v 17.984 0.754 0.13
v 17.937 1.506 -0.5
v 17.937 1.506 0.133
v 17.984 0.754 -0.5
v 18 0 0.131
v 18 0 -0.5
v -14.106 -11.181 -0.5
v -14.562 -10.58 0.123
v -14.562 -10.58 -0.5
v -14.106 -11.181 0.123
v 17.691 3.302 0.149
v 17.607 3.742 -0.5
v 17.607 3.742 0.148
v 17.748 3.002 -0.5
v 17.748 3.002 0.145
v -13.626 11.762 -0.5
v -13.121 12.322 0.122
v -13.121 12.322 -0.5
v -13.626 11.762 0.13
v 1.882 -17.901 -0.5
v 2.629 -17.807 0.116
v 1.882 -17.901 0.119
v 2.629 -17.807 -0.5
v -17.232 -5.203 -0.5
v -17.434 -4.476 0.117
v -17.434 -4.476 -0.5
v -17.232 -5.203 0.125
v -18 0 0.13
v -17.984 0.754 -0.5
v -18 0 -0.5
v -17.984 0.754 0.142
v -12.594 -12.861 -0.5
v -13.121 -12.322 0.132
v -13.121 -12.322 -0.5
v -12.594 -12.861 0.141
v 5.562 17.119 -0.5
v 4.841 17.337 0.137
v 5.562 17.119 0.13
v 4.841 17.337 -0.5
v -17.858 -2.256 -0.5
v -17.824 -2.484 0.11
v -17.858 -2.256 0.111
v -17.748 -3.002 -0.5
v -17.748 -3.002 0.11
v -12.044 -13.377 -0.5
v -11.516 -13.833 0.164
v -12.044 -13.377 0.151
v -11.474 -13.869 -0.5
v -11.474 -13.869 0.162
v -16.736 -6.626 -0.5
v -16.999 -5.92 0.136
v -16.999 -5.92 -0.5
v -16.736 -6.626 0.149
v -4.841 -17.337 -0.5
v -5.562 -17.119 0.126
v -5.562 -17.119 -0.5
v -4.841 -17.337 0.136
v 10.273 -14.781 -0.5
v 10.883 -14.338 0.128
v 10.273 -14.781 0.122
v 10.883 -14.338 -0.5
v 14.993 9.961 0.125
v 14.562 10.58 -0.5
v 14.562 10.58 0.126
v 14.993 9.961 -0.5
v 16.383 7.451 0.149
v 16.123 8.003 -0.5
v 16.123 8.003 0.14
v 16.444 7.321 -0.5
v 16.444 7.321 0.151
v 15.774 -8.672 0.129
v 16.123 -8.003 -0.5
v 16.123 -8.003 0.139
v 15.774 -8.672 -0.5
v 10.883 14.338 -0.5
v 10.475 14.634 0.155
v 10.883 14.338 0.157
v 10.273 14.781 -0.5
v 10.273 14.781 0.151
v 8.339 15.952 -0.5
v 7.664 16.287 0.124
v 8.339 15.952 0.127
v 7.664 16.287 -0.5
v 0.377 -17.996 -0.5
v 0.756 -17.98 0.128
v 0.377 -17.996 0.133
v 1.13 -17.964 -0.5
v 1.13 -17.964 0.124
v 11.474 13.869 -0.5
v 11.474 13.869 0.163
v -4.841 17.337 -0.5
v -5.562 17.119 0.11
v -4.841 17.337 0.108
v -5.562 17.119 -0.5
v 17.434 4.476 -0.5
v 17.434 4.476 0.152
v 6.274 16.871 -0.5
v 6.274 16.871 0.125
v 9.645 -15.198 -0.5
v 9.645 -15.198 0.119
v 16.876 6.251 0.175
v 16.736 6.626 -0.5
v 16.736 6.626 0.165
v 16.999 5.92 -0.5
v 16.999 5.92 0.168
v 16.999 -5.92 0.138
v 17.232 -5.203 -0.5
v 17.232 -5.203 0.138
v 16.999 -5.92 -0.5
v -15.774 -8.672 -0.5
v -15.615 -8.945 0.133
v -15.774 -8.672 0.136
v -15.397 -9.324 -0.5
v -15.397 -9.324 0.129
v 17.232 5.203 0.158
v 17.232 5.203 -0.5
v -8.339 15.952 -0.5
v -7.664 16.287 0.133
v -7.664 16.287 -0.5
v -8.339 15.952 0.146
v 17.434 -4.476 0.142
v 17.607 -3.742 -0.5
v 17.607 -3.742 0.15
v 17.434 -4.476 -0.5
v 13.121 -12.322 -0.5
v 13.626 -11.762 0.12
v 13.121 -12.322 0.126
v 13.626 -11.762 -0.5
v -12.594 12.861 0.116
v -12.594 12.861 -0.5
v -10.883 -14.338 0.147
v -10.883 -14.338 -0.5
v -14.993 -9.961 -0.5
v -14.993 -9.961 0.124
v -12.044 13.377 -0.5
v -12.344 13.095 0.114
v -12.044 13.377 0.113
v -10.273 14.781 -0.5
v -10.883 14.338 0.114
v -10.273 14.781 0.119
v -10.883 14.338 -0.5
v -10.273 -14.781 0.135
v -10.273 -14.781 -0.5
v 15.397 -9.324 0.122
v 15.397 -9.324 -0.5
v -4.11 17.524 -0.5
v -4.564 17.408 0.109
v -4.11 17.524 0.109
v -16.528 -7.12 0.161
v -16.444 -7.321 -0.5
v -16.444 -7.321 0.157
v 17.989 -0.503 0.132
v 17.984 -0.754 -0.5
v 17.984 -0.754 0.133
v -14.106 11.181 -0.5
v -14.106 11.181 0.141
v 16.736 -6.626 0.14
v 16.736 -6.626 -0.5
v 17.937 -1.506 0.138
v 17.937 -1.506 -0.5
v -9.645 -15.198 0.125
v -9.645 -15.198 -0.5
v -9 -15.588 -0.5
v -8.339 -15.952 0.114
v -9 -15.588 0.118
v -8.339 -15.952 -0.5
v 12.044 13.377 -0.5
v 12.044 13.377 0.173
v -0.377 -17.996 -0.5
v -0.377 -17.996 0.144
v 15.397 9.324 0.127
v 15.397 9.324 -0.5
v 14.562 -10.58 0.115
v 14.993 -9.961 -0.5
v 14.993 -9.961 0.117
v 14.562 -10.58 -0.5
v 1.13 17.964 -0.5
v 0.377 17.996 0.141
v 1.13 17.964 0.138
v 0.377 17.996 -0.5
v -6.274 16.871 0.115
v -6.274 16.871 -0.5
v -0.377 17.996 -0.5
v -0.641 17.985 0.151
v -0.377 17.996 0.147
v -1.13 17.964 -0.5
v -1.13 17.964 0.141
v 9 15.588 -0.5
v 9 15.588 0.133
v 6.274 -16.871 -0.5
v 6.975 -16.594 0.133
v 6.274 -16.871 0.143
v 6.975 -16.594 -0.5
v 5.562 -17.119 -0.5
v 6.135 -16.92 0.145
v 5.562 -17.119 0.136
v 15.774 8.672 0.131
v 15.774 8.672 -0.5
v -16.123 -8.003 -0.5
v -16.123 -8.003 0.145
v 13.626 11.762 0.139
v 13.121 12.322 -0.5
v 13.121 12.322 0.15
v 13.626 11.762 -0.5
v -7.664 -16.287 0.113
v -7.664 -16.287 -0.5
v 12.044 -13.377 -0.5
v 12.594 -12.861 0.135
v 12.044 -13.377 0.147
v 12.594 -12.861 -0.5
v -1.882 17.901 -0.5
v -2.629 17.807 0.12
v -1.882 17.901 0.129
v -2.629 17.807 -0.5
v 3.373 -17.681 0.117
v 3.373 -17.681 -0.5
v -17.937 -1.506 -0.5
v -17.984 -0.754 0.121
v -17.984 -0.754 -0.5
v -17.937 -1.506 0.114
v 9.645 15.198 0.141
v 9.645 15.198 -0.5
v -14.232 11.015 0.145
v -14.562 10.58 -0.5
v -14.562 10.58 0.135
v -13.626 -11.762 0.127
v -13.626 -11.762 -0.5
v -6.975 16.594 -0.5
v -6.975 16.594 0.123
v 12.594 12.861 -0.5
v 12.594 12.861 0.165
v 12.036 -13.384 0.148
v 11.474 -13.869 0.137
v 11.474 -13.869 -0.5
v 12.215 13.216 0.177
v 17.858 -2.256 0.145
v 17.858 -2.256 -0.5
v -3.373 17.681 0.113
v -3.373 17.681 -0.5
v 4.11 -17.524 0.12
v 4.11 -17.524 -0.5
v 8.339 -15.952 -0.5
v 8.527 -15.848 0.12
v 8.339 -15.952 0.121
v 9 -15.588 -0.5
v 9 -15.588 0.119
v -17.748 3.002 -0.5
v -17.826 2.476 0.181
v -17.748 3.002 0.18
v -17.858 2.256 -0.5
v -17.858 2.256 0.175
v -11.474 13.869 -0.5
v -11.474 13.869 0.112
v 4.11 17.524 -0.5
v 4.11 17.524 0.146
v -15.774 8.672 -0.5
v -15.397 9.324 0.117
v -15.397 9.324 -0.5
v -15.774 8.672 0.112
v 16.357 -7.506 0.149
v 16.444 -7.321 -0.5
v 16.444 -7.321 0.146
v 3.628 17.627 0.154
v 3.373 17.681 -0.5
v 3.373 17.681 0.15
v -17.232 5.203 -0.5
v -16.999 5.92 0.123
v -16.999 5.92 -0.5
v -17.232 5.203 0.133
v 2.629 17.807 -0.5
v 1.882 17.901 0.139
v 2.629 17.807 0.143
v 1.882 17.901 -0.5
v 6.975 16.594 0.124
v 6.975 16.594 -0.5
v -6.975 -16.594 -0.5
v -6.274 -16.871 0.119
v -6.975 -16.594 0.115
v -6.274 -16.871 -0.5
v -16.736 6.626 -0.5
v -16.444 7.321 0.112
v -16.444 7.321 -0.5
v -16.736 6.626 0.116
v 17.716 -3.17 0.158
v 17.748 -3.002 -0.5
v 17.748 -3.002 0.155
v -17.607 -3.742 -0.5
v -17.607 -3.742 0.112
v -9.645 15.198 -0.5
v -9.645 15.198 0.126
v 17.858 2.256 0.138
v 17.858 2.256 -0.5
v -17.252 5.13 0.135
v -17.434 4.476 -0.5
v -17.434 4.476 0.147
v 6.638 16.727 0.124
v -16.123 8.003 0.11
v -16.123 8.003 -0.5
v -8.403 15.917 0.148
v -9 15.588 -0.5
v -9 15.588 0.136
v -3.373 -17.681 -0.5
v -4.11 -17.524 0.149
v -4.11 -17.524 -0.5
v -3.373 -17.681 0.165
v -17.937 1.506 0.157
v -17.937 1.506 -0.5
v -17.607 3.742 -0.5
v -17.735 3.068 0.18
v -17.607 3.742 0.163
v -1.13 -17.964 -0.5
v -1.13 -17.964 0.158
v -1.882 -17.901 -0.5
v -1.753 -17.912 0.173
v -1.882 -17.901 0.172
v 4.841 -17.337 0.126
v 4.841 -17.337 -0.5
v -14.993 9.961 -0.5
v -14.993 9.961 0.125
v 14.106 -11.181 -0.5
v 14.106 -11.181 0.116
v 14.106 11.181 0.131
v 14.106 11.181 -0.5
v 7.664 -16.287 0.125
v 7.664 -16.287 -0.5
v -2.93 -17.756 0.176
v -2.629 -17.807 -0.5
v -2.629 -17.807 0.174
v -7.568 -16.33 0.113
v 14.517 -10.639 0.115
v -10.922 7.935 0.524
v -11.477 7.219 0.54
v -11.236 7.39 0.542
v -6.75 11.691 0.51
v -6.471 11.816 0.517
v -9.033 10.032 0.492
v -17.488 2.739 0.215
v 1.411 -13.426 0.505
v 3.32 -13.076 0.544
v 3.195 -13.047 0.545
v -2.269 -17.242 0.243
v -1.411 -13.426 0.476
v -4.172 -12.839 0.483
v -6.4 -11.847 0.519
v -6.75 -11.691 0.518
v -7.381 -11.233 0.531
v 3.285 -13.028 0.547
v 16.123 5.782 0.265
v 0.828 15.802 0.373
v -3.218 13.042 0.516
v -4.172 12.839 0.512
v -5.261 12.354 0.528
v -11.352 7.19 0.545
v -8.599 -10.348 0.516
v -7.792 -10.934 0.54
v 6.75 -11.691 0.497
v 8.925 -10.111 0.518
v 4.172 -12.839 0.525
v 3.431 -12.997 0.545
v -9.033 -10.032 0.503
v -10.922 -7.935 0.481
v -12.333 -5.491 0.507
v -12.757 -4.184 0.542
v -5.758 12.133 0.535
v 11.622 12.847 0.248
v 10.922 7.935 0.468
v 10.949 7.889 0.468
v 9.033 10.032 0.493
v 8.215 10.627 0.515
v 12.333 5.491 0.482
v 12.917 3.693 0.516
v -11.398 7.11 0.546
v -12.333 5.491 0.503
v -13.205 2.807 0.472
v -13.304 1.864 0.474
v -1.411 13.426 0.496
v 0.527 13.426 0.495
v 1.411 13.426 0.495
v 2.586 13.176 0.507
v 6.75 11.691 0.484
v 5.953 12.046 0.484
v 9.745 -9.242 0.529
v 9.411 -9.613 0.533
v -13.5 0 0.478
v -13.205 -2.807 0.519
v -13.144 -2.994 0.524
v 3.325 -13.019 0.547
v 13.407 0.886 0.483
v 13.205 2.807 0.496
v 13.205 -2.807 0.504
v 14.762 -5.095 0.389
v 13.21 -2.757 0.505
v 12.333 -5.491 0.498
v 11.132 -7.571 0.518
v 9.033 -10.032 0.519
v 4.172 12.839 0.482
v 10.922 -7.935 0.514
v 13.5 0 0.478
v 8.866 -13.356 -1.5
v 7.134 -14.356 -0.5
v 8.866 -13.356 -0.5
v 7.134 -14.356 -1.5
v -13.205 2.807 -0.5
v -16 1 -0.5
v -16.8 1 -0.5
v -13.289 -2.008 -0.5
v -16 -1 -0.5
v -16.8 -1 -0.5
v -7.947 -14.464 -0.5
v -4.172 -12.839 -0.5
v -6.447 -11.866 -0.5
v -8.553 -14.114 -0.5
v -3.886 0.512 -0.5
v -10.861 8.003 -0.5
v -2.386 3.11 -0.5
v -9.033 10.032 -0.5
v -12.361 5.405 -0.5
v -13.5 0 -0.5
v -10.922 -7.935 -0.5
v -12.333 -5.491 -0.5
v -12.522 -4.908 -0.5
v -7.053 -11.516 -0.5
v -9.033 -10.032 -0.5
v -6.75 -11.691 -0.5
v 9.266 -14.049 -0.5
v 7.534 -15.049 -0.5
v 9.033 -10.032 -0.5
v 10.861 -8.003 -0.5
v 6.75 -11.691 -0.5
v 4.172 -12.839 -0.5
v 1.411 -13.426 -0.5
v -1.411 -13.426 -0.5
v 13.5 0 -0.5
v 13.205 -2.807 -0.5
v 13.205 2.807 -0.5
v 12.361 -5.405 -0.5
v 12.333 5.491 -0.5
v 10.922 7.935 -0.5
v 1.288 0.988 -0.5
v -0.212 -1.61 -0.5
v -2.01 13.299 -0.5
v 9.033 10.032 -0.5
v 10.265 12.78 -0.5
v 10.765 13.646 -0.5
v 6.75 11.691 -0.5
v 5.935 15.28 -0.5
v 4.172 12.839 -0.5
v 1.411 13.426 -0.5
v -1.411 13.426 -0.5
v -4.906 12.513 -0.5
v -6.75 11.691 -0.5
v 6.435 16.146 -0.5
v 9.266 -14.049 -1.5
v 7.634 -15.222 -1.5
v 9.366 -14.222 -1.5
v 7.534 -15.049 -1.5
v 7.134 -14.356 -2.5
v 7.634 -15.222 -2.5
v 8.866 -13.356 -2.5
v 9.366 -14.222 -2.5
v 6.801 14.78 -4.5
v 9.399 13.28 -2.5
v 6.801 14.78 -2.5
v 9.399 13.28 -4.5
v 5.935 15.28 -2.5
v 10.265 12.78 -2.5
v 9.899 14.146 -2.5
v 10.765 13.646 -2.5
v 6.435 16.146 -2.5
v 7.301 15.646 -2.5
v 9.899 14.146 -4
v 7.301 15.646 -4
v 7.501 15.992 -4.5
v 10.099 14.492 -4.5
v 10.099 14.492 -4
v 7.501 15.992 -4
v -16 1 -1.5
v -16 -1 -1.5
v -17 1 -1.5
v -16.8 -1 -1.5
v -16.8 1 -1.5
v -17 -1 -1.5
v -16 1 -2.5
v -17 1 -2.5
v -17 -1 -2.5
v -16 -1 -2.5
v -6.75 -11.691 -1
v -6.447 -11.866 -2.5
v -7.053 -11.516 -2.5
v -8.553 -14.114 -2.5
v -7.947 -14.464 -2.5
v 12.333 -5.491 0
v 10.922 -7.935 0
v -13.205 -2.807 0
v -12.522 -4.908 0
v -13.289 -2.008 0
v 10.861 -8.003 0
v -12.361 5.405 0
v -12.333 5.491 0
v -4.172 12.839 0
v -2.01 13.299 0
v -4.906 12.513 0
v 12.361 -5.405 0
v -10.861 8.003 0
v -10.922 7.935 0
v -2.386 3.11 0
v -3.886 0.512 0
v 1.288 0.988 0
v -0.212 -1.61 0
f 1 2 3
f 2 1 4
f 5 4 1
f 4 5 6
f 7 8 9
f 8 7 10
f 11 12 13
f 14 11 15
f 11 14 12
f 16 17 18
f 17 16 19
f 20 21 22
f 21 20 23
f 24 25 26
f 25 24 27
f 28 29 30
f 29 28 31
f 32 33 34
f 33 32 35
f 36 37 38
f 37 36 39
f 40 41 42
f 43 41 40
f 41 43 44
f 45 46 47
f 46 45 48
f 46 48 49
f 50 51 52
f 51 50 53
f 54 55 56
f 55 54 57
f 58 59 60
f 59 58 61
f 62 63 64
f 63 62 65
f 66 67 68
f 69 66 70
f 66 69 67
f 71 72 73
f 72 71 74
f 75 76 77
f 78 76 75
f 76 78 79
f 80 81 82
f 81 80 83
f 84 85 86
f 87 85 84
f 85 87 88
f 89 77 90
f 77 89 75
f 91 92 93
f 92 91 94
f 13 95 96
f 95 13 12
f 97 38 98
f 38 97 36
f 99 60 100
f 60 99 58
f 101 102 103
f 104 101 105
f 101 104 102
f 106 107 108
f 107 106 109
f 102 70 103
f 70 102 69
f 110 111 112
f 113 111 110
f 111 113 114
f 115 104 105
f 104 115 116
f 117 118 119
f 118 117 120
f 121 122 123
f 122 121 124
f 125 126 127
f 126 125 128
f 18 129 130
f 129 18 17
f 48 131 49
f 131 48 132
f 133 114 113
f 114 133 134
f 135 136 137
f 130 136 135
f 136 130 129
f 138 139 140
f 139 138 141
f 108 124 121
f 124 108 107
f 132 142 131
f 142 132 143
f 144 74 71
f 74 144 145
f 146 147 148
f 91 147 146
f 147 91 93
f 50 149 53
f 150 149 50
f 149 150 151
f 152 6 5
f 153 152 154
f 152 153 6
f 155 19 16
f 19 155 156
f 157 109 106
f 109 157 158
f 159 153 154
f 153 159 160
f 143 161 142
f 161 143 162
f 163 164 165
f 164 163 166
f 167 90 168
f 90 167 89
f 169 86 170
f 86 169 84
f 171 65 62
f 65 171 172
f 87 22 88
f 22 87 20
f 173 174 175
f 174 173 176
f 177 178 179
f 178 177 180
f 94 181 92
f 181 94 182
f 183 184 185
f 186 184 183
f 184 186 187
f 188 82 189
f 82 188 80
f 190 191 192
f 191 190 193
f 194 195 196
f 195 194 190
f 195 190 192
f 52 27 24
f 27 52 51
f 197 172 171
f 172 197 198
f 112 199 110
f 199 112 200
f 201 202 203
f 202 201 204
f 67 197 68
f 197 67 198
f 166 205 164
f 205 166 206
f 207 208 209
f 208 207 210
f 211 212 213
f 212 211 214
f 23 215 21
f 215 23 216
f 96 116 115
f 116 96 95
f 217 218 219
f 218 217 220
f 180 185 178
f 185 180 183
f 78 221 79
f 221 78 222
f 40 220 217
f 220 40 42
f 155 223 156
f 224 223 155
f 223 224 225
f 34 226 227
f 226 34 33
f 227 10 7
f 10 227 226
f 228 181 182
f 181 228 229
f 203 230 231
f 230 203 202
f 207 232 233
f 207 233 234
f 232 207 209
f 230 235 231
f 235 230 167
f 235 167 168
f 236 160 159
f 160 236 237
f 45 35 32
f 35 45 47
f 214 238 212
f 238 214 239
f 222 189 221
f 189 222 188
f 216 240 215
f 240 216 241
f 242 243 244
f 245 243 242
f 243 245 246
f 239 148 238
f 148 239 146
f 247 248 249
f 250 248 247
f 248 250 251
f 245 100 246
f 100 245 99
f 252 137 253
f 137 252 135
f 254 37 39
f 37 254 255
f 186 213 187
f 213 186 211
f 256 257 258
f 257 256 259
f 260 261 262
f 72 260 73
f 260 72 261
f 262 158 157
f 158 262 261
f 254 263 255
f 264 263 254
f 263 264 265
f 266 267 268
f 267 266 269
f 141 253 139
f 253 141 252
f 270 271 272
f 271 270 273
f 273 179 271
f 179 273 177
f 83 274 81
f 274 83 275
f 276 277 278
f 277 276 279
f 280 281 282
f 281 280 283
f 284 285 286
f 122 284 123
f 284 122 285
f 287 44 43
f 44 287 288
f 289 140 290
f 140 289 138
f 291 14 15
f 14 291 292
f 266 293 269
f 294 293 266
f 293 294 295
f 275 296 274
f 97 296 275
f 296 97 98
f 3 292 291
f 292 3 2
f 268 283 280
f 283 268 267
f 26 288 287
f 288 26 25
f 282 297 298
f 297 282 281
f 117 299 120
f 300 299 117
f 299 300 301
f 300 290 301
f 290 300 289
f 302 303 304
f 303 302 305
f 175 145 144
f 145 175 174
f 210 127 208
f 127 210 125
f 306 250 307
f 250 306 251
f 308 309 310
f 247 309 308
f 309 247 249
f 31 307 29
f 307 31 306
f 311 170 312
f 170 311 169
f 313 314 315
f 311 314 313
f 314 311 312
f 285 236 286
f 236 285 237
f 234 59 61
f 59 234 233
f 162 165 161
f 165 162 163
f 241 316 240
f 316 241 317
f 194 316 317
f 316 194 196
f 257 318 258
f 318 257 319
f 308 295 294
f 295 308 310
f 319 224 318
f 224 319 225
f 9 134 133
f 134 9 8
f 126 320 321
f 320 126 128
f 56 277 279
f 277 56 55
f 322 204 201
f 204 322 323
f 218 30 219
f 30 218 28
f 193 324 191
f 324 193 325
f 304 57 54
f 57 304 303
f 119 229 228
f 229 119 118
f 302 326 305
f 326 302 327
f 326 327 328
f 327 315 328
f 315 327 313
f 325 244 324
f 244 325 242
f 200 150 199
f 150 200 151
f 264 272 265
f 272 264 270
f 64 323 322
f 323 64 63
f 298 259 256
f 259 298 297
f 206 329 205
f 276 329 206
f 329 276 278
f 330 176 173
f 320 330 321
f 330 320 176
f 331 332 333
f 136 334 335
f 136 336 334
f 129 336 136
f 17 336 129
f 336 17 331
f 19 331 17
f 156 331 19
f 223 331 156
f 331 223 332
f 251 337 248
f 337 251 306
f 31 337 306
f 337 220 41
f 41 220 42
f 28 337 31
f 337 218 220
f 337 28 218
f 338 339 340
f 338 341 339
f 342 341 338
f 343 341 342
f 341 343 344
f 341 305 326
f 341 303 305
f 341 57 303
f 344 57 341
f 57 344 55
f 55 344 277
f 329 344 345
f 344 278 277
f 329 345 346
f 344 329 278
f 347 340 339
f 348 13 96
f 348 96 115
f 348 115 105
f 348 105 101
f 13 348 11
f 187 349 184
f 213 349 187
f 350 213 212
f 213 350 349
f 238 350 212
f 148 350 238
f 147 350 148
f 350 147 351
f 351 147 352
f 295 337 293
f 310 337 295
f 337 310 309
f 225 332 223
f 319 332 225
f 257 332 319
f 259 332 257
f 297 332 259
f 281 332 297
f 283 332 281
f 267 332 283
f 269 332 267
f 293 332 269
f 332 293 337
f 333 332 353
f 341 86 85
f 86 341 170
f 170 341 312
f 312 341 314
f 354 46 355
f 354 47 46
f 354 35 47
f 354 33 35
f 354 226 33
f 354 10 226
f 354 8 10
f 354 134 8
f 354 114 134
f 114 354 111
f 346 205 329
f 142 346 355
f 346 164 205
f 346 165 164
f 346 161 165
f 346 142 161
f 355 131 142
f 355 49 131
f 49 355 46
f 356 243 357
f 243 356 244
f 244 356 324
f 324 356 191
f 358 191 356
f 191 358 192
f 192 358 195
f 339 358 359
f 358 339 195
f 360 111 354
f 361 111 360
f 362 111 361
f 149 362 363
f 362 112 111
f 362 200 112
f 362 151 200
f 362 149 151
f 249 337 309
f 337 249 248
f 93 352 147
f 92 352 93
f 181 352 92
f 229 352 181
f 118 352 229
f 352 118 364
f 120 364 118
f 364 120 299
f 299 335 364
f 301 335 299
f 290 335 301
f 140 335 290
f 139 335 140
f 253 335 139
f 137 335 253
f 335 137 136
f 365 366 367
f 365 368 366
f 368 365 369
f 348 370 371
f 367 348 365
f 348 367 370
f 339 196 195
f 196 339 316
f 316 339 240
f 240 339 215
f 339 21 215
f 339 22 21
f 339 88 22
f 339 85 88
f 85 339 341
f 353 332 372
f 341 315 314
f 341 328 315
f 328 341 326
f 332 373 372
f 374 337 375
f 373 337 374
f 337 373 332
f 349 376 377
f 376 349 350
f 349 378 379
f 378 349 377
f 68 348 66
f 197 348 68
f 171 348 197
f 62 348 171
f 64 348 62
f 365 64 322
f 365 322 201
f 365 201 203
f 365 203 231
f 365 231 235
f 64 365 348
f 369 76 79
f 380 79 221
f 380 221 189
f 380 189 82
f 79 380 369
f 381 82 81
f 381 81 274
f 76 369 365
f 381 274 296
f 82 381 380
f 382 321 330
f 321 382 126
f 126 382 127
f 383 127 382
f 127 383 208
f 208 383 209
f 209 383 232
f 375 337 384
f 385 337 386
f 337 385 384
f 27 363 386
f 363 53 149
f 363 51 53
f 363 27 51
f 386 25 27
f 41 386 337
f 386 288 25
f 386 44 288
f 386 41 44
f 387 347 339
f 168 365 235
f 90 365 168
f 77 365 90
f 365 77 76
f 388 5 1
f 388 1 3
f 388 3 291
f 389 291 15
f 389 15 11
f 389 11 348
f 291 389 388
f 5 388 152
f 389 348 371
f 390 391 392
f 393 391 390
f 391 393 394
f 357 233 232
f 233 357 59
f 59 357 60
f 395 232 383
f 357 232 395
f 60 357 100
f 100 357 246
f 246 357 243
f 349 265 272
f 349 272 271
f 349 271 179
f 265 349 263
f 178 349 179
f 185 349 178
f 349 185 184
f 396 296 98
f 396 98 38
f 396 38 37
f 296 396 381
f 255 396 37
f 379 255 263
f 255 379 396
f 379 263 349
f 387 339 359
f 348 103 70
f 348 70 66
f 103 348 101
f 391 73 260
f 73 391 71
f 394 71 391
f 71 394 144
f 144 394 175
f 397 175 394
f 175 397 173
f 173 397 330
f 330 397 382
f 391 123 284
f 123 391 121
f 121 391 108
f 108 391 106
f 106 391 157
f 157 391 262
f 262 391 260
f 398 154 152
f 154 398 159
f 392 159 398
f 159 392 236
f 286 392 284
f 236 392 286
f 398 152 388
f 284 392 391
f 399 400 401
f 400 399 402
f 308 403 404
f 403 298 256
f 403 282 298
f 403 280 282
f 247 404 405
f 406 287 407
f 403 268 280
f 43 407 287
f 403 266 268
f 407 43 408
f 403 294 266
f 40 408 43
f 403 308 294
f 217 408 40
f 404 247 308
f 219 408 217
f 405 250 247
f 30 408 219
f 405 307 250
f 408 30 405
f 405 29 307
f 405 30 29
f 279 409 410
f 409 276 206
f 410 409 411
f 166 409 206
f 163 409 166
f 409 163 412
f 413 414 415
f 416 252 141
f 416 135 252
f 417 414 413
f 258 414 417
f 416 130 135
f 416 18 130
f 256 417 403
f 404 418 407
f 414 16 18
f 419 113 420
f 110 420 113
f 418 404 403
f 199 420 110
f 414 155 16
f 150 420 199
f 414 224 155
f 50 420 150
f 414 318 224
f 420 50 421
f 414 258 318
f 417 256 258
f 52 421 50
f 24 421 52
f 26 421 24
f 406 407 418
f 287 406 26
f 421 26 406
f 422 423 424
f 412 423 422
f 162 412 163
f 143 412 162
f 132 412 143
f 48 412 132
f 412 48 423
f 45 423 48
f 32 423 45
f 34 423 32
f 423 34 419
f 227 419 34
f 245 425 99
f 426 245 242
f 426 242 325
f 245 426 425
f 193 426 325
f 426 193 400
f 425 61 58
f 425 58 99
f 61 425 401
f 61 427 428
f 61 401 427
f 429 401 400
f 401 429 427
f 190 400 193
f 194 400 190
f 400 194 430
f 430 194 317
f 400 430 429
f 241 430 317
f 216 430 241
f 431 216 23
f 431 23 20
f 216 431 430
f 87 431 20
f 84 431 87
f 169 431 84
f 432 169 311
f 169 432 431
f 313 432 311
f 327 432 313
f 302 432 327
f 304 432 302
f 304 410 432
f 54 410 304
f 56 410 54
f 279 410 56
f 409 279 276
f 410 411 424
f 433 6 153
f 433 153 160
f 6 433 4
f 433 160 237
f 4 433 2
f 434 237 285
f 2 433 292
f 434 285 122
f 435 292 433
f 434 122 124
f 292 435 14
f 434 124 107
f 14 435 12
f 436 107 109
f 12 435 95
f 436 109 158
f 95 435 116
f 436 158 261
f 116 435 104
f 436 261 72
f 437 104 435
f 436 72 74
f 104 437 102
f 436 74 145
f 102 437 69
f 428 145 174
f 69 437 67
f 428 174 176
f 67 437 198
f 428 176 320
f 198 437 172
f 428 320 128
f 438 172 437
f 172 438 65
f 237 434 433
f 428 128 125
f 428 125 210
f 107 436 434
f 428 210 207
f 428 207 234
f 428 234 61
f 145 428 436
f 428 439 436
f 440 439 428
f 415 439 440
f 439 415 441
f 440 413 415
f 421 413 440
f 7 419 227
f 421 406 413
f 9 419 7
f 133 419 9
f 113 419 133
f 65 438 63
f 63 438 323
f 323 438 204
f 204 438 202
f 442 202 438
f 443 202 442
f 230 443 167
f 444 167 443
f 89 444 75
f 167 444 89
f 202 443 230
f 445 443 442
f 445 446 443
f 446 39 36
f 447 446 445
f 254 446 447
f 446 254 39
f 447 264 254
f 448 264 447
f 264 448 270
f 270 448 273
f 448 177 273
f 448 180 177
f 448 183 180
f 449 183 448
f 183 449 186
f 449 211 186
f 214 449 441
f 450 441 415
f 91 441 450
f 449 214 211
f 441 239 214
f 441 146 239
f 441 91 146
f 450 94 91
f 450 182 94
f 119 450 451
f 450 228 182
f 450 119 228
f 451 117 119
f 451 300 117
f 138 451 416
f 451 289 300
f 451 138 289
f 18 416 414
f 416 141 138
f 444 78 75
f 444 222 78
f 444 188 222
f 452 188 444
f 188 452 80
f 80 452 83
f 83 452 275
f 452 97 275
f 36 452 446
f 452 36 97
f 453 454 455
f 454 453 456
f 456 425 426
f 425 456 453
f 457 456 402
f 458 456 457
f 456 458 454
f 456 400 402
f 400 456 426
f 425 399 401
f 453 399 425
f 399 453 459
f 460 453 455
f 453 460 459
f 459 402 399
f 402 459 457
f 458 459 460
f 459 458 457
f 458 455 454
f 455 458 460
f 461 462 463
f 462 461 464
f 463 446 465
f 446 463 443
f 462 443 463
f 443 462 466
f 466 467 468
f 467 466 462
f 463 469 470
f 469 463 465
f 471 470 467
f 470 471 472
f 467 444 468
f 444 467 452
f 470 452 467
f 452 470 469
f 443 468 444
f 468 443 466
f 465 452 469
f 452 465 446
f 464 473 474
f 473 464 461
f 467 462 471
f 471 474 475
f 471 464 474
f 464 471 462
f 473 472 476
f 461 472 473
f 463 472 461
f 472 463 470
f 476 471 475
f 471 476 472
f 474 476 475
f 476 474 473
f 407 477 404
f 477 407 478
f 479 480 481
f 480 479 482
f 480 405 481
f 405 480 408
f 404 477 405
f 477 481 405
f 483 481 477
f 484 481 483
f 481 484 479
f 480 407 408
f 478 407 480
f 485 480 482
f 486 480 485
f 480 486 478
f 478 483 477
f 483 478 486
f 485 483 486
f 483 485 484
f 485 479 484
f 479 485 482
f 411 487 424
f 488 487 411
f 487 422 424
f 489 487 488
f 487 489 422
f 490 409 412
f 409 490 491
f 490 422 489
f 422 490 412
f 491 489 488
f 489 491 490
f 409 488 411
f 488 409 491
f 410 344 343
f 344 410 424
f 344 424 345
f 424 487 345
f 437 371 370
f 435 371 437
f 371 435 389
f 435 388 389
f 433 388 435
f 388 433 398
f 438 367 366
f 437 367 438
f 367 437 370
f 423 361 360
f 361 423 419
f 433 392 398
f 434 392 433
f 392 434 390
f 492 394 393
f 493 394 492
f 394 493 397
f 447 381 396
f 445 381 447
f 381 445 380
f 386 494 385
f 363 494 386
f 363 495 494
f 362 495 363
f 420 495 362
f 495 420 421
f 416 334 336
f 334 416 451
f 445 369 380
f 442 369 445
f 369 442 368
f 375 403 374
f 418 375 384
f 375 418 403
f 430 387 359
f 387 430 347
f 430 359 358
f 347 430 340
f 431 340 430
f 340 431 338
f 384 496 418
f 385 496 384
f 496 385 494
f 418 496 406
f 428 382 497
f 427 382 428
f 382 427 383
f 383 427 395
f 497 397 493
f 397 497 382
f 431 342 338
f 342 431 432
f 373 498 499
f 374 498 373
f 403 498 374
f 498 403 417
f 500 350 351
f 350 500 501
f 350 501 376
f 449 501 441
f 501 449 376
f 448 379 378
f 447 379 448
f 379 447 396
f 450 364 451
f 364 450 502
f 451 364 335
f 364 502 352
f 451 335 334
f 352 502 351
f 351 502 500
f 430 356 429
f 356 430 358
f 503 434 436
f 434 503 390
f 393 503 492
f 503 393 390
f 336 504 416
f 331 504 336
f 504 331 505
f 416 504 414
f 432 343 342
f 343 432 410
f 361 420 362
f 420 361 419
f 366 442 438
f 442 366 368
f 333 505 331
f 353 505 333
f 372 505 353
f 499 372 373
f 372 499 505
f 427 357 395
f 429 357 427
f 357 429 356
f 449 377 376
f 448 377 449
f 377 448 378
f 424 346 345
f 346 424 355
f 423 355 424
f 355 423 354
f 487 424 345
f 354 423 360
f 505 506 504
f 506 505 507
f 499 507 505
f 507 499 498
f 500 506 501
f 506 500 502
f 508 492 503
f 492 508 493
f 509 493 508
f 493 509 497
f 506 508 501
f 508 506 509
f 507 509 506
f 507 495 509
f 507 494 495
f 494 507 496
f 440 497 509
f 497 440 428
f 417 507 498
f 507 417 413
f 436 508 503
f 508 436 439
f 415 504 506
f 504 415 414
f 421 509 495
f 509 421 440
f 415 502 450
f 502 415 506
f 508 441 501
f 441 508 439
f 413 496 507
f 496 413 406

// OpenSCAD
difference(){
    ear();
    translate([0,0,-1]) cylinder(h=3,d=27);
}
width = 3;
rotate([0,0,360/6]){
rotate([0,0,-90])
translate([-width/2,-width/2,-0.5])cube([36/2,width,0.5]);

rotate([0,0,45])
translate([-width/2,-width/2,-0.5])cube([36/2,width,0.5]);

rotate([0,0,90])
translate([-width/2,-width/2,-0.5])cube([36/2,width,0.5]);

rotate([0,0,135])
translate([-width/2,-width/2,-0.5])cube([36/2,width,0.5]);
}

module ear(){
    
    $fn=150;
    sphere_size=200;
    intersection(){
        cylinder(h=1,d=36);
        translate([0,0,-sphere_size+1])
        rotate([45,45,0])
        sphere(sphere_size);
    }
    translate([0,0,-0.5])cylinder(h=0.5,d=36);

    translate([-36/2+1.6,0,-1])cube([0.8,2,1], true);
    translate([-36/2+1.5,0,-2])cube([1,2,1], true);

    rotate([0,0,360/3]){
        translate([-36/2+1.6,0,-1])cube([0.8,2,1], true);
        translate([-36/2+1.5,0,-2])cube([1,2,1], true);
    }

    rotate([0,0,360/6]){
        translate([-36/2+3,0,-1.5])cube([3,0.7,2], true);
    }

    rotate([0,0,360/6+180]){
        translate([-36/2+1.3,0,-1.5])cube([1,5,2], true);
        translate([-36/2+1.3,0,-3.5])cube([1,3,2], true);
        translate([-36/2+1,0,-4.25])cube([1.2,3,0.5], true);
        
    }
}
